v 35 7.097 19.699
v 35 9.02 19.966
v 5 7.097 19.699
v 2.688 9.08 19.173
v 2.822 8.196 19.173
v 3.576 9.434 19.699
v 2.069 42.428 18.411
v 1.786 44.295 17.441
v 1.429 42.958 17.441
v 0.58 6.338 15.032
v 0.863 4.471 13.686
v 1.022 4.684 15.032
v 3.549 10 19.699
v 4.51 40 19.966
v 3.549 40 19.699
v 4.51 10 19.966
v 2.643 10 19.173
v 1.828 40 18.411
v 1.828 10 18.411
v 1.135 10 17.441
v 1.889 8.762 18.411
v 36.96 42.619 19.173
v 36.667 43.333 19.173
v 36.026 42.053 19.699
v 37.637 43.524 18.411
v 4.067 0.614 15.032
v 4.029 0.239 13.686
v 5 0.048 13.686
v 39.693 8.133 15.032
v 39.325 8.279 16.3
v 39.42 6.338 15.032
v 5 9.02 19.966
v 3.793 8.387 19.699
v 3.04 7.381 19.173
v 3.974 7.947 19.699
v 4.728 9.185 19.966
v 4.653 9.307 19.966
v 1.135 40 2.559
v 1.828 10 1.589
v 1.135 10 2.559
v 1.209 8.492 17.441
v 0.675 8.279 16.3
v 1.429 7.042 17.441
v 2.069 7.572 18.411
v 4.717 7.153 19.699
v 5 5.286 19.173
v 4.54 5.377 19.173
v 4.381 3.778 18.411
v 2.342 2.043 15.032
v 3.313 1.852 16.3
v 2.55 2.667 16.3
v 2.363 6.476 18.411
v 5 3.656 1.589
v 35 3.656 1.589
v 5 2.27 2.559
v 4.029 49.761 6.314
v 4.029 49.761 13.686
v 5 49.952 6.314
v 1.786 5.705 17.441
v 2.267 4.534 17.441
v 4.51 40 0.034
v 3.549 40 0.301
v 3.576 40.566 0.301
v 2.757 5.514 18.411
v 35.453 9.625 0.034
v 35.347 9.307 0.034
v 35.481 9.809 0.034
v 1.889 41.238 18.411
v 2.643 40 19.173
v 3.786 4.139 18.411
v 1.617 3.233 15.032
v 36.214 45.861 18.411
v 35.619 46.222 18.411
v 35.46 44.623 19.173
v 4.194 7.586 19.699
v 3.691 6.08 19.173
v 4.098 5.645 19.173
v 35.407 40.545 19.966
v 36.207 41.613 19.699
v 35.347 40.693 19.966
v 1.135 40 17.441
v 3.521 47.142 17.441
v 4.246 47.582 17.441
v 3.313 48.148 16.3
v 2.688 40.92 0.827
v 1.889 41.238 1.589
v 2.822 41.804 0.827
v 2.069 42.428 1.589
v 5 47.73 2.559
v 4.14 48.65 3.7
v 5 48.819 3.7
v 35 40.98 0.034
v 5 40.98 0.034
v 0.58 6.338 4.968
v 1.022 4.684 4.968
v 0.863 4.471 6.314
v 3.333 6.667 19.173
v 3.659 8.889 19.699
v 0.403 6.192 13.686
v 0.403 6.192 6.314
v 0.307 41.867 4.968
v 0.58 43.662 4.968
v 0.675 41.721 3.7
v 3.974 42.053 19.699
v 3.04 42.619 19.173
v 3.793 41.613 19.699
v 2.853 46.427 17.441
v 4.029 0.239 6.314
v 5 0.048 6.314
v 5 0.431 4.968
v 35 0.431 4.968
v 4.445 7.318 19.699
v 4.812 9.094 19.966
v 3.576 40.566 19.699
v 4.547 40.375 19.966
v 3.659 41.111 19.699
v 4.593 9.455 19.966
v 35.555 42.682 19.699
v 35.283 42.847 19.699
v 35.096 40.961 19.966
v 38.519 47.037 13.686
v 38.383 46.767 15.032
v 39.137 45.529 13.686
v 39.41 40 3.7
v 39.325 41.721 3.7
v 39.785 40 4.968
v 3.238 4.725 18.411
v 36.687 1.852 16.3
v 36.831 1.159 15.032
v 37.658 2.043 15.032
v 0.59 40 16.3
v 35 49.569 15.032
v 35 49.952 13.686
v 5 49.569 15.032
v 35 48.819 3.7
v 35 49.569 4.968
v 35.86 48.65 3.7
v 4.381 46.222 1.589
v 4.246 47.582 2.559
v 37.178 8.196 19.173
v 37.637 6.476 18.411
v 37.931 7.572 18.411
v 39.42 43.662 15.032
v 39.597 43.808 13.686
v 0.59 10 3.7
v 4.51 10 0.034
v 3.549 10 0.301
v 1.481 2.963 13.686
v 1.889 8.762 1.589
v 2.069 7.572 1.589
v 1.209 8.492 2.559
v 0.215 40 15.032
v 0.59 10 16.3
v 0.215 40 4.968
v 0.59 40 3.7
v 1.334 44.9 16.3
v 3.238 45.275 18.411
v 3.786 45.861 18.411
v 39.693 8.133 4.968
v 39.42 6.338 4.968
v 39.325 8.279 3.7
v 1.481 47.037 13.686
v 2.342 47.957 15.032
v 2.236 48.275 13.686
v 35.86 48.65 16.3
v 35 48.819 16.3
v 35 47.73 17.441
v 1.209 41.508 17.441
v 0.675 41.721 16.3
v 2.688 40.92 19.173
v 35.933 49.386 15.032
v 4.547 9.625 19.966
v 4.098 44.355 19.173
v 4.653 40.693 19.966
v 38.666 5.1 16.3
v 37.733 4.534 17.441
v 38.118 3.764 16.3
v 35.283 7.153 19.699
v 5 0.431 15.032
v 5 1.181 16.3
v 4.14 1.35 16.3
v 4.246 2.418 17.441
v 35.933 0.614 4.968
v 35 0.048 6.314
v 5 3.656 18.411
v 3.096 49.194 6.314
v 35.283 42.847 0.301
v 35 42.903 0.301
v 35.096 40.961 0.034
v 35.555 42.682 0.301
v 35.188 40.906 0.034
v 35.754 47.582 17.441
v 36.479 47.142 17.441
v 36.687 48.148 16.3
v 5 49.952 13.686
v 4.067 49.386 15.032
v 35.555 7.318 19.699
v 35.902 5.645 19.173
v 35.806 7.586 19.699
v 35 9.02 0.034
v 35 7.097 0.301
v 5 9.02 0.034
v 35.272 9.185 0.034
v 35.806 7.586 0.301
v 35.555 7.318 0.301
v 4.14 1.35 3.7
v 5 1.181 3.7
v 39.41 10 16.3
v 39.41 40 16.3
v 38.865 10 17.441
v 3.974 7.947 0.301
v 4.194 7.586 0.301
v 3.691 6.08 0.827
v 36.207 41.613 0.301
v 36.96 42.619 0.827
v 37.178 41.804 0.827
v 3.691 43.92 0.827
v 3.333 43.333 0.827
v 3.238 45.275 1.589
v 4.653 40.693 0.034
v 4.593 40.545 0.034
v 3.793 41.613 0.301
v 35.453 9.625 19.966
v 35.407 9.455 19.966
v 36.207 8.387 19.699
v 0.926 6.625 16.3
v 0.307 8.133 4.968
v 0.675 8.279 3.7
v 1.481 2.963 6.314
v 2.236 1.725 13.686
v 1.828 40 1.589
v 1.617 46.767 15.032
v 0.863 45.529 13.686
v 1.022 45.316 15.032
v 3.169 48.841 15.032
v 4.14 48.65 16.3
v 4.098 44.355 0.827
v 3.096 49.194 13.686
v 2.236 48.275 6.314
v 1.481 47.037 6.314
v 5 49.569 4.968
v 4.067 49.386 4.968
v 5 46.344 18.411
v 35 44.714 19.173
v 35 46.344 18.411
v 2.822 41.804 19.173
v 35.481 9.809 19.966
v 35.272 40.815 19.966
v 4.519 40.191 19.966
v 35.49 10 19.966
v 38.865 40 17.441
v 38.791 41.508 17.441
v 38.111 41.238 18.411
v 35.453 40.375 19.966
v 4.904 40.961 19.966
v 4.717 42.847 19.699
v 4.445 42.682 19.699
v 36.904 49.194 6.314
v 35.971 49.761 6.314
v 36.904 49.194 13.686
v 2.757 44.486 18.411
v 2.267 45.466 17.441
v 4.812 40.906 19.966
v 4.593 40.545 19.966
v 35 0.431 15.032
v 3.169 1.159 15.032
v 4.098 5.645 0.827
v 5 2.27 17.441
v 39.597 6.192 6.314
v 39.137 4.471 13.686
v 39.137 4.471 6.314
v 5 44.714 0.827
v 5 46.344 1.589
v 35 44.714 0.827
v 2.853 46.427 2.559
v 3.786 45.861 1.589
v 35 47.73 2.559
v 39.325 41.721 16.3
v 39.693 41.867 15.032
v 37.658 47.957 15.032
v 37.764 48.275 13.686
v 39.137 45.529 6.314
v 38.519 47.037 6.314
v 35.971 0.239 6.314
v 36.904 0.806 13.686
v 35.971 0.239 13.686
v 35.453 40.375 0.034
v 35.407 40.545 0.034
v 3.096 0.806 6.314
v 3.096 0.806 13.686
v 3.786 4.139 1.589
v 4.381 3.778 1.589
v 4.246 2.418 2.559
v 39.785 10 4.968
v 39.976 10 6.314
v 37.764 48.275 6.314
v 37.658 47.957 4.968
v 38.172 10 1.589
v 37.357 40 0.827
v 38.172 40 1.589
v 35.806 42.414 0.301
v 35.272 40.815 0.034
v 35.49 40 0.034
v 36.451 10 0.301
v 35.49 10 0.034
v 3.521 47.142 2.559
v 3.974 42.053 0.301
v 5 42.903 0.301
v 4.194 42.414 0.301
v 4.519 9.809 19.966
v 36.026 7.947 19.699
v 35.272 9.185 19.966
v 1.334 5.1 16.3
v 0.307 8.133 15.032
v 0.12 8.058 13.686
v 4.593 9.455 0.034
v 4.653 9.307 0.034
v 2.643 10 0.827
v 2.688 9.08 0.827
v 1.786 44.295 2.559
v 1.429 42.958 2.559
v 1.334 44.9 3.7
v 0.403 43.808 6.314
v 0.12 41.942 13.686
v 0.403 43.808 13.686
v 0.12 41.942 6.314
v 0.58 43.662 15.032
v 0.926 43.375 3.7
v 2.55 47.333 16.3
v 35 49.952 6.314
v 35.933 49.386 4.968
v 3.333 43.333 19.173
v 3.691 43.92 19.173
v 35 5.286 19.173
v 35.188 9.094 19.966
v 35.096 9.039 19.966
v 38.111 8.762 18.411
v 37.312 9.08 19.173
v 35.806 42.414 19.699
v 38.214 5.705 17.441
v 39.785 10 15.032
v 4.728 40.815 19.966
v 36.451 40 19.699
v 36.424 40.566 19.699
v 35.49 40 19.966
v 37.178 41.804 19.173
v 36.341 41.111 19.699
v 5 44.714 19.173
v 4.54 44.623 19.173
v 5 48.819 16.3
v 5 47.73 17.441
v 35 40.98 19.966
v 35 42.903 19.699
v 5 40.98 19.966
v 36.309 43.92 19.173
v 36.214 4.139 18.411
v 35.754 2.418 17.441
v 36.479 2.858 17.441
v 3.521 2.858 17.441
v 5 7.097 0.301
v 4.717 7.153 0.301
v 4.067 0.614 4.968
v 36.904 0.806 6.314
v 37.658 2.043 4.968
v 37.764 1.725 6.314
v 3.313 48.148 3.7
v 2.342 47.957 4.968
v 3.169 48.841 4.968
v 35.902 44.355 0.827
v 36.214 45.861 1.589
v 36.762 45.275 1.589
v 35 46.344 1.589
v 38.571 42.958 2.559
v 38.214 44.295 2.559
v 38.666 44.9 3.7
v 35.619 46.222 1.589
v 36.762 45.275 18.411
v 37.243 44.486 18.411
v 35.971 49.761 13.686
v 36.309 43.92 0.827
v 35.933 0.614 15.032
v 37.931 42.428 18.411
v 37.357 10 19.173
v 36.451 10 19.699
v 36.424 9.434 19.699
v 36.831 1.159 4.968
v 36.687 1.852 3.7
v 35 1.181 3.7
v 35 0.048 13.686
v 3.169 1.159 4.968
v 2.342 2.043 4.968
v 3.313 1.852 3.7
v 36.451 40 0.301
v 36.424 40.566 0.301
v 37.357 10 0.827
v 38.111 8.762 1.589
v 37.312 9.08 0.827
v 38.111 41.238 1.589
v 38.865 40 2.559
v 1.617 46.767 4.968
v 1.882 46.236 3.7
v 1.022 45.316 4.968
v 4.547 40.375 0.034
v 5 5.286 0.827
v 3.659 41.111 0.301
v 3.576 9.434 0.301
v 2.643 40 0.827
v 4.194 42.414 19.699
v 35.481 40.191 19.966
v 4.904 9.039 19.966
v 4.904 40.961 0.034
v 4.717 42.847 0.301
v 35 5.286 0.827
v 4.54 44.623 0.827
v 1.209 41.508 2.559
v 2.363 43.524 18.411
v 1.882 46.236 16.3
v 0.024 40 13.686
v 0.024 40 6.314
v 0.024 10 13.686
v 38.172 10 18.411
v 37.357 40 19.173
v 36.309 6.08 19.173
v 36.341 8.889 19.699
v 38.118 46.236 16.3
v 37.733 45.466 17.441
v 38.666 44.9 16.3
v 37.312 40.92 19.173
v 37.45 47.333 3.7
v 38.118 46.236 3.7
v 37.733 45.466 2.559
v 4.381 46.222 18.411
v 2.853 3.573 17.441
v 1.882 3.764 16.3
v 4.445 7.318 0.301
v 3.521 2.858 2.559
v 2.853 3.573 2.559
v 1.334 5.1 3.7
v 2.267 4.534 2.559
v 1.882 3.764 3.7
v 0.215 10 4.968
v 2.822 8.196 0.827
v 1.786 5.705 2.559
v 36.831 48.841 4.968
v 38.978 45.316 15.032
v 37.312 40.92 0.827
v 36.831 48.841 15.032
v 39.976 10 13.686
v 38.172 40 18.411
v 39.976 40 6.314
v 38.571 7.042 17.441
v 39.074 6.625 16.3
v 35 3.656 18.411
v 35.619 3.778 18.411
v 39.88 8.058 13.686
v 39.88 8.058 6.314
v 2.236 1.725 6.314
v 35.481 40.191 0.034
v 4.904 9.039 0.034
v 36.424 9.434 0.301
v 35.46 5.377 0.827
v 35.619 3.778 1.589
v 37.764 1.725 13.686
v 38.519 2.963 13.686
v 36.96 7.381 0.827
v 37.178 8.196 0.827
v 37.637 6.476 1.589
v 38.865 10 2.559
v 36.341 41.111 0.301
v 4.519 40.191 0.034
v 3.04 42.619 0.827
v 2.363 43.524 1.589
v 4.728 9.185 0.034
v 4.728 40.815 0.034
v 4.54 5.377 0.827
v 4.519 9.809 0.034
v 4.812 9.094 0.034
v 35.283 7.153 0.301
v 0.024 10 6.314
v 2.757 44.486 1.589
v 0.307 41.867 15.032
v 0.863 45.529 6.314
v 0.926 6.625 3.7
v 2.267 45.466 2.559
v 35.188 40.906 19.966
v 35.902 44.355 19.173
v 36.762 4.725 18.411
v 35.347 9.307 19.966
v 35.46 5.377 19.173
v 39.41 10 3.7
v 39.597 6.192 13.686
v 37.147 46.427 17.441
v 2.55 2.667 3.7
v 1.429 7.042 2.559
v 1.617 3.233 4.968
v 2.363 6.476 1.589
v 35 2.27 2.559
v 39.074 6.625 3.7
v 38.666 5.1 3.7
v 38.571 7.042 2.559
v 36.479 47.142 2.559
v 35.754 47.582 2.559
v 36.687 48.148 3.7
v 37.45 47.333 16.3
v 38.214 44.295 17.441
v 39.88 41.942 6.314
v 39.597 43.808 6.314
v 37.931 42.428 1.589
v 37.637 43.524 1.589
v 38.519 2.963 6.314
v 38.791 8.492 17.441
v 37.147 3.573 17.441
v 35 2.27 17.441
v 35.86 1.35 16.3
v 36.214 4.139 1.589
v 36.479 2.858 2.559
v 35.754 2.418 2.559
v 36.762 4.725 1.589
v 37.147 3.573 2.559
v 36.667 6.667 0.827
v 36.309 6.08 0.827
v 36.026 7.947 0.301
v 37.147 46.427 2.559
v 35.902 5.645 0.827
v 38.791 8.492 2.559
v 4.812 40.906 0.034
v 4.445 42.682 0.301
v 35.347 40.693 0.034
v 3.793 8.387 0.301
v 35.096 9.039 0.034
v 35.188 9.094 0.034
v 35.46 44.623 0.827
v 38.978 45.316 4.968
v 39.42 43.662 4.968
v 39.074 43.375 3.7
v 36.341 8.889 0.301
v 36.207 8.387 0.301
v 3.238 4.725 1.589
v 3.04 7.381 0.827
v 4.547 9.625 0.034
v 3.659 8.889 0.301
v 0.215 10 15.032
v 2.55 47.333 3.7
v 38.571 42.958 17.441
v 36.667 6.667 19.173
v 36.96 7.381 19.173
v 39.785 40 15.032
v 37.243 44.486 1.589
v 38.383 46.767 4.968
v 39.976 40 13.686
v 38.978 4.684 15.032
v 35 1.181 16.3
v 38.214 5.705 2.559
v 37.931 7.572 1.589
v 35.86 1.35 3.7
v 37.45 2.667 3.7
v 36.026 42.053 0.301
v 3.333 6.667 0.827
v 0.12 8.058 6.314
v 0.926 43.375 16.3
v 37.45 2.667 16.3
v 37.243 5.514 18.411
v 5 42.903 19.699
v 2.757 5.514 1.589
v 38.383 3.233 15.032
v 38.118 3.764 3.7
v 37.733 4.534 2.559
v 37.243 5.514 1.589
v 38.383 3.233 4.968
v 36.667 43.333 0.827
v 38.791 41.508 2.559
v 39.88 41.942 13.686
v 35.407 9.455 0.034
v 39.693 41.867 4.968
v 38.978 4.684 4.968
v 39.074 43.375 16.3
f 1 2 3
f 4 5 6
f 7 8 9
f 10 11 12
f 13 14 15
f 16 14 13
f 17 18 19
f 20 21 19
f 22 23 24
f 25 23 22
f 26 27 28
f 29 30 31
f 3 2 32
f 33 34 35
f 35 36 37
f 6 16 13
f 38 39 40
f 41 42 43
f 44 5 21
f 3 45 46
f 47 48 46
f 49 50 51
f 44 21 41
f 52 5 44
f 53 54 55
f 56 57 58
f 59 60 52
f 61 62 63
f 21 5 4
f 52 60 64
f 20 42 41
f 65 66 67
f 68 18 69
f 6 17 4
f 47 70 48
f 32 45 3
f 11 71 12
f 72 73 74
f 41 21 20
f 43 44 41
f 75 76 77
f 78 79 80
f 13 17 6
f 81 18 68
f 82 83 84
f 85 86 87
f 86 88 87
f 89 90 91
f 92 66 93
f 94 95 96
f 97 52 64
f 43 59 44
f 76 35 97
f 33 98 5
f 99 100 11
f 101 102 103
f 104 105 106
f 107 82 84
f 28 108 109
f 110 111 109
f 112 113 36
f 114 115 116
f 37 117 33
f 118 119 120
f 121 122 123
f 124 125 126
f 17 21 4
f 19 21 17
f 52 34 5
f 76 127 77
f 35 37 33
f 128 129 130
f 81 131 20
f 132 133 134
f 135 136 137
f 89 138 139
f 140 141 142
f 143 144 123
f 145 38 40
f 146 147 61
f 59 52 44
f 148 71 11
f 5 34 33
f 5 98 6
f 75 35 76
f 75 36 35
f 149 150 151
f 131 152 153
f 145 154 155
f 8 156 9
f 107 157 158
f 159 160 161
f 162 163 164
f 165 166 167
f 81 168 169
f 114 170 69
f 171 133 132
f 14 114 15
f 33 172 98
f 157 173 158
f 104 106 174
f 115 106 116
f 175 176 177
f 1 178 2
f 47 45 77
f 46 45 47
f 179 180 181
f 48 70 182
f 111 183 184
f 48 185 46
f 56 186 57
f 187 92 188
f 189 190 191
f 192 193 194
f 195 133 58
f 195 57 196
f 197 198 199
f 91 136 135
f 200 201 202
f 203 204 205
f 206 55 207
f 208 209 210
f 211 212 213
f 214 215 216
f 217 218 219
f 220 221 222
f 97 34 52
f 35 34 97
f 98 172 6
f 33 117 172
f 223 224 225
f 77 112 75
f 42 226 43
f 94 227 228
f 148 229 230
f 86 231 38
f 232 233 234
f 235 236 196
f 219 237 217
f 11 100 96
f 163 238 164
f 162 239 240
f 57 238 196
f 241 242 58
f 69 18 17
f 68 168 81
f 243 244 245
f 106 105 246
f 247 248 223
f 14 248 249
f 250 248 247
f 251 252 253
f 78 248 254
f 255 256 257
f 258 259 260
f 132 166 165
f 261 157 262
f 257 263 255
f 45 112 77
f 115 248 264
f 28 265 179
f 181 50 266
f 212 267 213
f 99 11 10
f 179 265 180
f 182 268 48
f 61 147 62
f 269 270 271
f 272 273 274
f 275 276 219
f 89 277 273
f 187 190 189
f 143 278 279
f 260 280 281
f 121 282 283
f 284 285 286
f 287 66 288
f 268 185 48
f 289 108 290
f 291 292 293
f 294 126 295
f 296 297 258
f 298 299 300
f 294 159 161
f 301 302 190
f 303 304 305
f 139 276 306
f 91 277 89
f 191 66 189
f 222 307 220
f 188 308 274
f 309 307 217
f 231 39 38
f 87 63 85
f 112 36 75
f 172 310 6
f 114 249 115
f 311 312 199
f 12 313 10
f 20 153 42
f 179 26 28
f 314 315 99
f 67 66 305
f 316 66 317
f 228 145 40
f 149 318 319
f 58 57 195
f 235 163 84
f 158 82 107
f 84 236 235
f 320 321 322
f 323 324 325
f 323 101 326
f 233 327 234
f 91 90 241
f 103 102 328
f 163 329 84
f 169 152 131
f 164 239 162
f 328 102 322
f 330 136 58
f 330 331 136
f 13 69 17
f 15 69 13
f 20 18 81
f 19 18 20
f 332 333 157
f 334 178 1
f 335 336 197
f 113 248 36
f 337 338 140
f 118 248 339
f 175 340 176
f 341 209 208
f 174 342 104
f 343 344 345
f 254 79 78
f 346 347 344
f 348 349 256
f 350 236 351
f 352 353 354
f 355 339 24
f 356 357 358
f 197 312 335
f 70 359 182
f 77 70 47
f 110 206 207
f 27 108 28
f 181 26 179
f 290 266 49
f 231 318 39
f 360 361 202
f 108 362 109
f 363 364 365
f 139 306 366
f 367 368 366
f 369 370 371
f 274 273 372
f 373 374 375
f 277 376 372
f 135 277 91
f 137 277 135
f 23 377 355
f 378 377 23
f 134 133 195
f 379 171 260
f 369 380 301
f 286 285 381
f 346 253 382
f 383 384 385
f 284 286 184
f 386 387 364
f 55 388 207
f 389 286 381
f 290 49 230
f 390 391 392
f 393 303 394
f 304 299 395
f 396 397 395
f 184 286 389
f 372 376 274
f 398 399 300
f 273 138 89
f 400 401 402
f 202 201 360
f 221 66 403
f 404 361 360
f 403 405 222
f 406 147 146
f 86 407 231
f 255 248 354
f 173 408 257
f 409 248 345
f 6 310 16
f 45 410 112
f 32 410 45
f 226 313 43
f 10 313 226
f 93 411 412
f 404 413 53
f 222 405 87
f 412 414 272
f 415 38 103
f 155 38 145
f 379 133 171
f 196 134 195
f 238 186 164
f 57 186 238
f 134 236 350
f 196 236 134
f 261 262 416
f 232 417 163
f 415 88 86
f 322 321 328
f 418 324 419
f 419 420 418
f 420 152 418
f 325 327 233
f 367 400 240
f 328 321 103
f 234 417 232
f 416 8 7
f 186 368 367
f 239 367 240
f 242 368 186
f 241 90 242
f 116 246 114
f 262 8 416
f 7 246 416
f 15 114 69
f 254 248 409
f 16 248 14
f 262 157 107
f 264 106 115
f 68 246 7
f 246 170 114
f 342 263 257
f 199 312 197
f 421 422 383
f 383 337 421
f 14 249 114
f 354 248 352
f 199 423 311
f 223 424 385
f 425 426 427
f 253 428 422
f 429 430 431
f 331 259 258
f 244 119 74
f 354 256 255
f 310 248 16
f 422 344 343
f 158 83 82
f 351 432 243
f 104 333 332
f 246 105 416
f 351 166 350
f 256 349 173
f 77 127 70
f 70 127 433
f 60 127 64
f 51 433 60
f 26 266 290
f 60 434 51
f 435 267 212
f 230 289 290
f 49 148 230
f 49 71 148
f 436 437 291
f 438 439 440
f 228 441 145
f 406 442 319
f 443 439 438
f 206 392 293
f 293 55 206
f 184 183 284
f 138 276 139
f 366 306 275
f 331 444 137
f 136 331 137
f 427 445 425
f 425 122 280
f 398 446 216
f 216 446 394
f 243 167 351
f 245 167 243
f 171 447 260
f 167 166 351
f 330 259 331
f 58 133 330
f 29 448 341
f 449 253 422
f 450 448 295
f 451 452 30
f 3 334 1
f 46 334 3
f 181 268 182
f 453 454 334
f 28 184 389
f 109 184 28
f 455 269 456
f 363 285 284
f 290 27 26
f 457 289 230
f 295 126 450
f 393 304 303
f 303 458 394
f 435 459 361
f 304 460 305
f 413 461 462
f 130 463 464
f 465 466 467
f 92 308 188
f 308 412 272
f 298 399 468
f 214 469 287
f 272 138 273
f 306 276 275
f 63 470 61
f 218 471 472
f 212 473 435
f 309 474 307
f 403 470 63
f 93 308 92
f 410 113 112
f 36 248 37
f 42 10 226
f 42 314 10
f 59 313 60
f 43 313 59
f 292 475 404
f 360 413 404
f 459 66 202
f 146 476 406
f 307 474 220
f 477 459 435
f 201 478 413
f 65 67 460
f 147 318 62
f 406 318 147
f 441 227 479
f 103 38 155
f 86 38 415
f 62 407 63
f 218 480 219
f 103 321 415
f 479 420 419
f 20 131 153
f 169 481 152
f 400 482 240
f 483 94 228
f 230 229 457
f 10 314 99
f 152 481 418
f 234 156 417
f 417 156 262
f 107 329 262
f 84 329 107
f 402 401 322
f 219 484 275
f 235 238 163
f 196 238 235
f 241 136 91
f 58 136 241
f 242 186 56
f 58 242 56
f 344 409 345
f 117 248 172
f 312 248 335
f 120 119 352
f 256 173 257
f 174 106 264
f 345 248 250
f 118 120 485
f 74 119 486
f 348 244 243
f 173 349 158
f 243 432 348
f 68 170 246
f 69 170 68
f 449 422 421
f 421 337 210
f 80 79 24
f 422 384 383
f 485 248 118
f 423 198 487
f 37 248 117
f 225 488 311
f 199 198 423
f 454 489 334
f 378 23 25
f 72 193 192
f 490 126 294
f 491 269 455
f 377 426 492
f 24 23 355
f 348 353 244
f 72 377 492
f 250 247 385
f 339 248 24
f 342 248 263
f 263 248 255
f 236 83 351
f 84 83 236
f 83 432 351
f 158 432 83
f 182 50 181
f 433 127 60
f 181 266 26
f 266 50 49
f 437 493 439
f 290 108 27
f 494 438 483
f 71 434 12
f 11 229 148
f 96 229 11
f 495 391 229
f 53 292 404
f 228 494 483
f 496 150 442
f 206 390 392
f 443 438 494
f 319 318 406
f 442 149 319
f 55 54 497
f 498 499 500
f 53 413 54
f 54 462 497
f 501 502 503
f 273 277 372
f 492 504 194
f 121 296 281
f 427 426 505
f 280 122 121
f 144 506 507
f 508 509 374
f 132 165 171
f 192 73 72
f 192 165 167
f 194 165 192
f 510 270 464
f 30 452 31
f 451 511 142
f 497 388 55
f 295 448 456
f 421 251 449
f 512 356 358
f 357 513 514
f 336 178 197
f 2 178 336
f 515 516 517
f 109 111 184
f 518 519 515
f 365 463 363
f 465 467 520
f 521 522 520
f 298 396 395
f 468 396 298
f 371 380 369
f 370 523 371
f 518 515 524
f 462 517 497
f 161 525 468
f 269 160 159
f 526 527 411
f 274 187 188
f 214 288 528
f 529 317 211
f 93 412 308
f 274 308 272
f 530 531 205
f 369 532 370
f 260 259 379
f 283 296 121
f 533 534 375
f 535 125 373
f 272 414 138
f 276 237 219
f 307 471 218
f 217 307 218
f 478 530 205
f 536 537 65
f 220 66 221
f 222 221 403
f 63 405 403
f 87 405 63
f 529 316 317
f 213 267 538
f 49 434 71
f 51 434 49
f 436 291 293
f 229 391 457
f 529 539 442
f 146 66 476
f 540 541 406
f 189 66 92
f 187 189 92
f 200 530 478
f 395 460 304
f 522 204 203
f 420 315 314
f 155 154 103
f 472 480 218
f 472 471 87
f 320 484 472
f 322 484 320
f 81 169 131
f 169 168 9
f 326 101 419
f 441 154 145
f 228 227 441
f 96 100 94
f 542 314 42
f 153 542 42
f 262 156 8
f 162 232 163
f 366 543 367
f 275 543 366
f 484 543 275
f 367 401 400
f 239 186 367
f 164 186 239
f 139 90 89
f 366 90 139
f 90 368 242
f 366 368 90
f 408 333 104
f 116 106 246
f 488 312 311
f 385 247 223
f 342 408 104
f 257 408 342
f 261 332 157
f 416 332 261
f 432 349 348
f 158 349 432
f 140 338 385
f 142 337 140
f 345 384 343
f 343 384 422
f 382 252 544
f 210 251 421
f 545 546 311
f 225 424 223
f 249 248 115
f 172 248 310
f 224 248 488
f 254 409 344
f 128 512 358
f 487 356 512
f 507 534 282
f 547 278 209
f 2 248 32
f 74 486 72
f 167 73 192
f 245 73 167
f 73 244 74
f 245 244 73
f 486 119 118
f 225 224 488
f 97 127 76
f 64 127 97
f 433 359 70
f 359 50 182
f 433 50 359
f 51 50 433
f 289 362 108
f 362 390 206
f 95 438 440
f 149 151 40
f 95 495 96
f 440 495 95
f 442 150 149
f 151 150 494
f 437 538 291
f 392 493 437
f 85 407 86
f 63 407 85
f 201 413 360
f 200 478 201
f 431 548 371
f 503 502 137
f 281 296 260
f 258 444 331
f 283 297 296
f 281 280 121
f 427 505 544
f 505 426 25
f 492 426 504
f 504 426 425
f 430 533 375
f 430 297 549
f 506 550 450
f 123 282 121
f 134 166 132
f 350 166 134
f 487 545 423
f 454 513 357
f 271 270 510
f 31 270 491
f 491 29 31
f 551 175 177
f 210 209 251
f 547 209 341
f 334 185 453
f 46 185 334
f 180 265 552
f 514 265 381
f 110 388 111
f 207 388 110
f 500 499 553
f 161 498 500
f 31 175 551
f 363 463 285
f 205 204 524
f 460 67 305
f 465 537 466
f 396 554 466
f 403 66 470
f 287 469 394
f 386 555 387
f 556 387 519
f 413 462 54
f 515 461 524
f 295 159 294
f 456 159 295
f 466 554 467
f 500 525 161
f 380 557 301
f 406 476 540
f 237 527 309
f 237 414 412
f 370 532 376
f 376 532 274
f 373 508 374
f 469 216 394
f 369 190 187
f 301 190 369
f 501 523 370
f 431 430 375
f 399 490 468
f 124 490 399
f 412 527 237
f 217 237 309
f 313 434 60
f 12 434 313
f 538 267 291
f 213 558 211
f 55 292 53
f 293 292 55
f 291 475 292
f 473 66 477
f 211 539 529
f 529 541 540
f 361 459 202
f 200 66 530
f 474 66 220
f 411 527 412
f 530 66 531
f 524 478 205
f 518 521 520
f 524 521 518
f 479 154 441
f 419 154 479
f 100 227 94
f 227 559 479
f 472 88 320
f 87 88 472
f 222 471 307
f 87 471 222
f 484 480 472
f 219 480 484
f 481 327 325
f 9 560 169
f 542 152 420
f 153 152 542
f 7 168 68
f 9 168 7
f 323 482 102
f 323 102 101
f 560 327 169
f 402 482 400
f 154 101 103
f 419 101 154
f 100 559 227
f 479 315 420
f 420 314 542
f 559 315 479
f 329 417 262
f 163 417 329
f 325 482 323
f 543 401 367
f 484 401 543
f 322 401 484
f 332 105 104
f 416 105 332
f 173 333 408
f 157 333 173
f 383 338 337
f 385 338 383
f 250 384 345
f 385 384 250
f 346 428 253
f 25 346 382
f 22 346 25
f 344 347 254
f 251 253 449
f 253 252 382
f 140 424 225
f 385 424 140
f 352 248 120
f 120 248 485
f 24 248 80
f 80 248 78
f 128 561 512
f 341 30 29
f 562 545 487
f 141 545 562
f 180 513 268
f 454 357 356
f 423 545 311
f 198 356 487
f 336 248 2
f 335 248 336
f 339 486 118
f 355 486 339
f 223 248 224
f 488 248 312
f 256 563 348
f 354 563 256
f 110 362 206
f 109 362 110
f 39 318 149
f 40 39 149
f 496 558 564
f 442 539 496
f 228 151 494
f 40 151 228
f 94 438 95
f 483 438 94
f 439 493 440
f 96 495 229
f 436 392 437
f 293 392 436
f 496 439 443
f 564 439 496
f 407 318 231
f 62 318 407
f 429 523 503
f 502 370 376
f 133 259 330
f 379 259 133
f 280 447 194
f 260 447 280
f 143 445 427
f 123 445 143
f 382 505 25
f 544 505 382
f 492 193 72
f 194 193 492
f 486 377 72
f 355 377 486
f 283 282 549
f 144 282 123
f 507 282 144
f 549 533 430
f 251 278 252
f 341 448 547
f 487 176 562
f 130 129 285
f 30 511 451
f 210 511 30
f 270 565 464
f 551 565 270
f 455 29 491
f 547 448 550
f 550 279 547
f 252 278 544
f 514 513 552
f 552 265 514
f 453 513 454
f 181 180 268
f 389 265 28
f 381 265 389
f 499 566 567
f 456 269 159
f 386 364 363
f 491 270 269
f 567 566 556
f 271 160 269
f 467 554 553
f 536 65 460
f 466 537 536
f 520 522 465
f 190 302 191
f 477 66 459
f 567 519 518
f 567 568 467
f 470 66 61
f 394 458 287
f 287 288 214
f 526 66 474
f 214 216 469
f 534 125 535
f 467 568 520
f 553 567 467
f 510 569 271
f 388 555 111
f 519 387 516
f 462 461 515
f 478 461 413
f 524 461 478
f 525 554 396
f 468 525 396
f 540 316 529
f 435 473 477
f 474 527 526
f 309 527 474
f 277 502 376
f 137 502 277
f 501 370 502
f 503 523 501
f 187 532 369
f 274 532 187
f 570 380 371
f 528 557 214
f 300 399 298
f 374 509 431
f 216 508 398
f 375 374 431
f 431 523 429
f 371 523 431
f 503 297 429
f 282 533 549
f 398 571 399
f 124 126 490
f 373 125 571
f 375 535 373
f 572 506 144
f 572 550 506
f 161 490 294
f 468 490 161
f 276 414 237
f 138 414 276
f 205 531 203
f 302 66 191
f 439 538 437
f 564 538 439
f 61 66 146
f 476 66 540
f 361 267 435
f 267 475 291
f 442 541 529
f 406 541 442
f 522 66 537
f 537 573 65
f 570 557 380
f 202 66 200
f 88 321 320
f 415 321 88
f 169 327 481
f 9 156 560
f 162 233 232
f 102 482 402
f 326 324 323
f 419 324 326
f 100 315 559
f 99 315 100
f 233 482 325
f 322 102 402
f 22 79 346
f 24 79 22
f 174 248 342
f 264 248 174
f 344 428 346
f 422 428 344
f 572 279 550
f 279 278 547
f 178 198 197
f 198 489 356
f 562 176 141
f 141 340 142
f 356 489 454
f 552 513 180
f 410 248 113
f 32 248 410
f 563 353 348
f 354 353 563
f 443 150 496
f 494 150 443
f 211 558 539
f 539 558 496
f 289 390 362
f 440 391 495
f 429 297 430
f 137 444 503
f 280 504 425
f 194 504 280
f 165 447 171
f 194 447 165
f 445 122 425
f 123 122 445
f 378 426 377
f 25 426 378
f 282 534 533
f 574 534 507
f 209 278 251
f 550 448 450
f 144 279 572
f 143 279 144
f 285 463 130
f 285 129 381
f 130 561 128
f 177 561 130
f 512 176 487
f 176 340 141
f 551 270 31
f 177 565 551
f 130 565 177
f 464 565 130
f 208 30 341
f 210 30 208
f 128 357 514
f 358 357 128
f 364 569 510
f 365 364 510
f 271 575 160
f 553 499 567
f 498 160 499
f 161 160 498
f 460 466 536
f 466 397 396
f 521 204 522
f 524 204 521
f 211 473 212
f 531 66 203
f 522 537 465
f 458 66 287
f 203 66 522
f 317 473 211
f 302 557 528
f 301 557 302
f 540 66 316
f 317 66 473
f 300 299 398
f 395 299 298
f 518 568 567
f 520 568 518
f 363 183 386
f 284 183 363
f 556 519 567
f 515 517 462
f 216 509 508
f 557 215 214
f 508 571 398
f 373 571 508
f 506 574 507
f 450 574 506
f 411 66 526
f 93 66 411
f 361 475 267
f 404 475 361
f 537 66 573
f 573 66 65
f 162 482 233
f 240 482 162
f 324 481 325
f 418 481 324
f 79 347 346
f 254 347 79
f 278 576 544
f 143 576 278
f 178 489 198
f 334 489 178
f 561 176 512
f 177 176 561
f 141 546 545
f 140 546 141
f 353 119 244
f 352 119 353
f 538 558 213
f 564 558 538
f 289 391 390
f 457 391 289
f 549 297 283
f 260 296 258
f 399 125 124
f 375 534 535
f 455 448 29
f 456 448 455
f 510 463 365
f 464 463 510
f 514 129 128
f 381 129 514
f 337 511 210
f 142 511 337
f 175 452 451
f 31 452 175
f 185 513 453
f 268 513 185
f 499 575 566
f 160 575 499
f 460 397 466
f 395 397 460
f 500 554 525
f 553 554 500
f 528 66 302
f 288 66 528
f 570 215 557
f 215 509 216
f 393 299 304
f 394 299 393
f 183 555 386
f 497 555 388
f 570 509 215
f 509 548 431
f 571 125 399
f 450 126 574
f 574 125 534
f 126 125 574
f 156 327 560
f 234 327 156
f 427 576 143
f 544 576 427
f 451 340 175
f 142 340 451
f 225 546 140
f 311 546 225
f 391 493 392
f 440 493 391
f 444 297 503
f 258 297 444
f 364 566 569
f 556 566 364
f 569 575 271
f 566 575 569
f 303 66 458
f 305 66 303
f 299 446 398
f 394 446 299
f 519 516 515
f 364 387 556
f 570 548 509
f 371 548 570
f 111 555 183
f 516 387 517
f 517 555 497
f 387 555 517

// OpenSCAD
/*
 *  OpenSCAD utilities 
 *
 *  by Ph.Gregoire AKA Greg Ware <greg.ware@laposte.net>
 *  
 *  Includes:
 *   - shorter macro modules to get a cube or cylinder with translation and rotation
 *   -  Due to some display defects in OpenSCAD preview (F5), some can use a small epsilon 
 *      so as to cut protruding apertures in solids
 *   - useful modules to build rounded corner cubes, prism (wedges), etc
 *
 * History
 * Date       Author      Description
 * 2017/??/?? Ph.Gregoire Initial version(s)
 * 2018/07/18 Ph.Gregoire Rework for X5S corners
 * 2020/04/30 Ph.Gregoire V2: Functions from Elec.scad
 *
 *  This work is licensed under the 
 *  Creative Commons Attribution 3.0 Unported License.
 *  To view a copy of this license, visit
 *    http://creativecommons.org/licenses/by/3.0/ 
 *  or send a letter to 
 *    Creative Commons, PO Box 1866, Mountain View, CA 94042, USA.
*/

// Thickness of supports for apertures
$_SUPPORT_THK=0.2;

// Cylinders $fn default
$_FN_CYL=$preview?12:32;
function GET_FN_CYL()=$_FN_CYL;

// Epsilon
$_EPSILON=0.2;
//function GET_EPSILON()=$preview?$_EPSILON:0;
function GET_EPSILON()=$_EPSILON;

/* Simple translation */
module tr(dx,dy=0,dz=0) {
    translate([dx,dy,dz]) children();
}

/* Z-translation */
module trz(dz) {
    translate([0,0,dz]) children();
}

/* Simple rotation */
module rot(ax=90,ay=0,az=0) {
    rotate([ax,ay,az]) children();
}

/* Simple rotation */
module rotY(ay=90) {
    rotate([0,ay,0]) children();
}

/* Translate and rotate children */
module trrot(tx,ty,tz,ax,ay=0,az=0) {
    translate([tx,ty,tz]) rotate([ax,ay,az]) children();
}

/* translated cube */
module trcube(tx,ty,tz,dx,dy,dz,center=false) {
    translate([tx,ty,tz]) cube(size=[dx,dy,dz],center=center);
}

/* translated cube with epsilons along Z */
module trcube_eps(tx,ty,tz,dx,dy,dz) {
    translate([tx,ty,tz-$_EPSILON]) cube([dx,dy,dz+2*$_EPSILON]);
}

/* translated cylinder */
module trcyl(tx,ty,tz,d,h,center=false,fn=$_FN_CYL) {
	translate([tx,ty,tz]) cylinder(d=d,h=h,center=center,$fn=fn);
}

/* translated cone */
module trcone(tx,ty,tz,d1,d2,h,center=false,fn=$_FN_CYL) {
	translate([tx,ty,tz]) cylinder(d1=d1,d2=d2,h=h,center=center,$fn=fn);
}

/* cylinder with epsilon along Z axis */
module cyl_eps(d,h,center=false,fn=$_FN_CYL) {
    cylinder(d=d,h=h+2*$_EPSILON,center=center,$fn=fn);
}

/* translated cylinder with epsilon along height (Z) */
module trcyl_eps(tx,ty,tz,d,h,center=false,fn=$_FN_CYL) {
    translate([tx,ty,tz-$_EPSILON]) cyl_eps(d,h,center=center,fn=fn);
}

module trrotcyl(tx,ty,tz,ax,ay,az,d,h,center=false,fn=$_FN_CYL) {
	trrot(tx,ty,tz,ax,ay,az) cylinder(d=d,h=h,center=center,$fn=fn);
}

module tube(dint,dout,h,center,fn=$_FN_CYL) {
    difference() {
        cylinder(d=dout,h=h,center=center,$fn=fn);
        cylinder(d=dint,h=h,center=center,$fn=fn);
    }
}

module trrottube(tx,ty,tz,ax,ay,az,dout,dint,h,center=false,fn=$_FN_CYL) {
	trrot(tx,ty,tz,ax,ay,az) tube(dout=dout,dint=dint,h=h,center=center,$fn=fn);
}

/* translated and rotated cylinder with epsilon along height (Z) */
module trrotcyl_eps(tx,ty,tz,ax,ay,az,d,h,center=false,fn=$_FN_CYL) {
    trrot(tx,ty,tz,ax,ay,az) translate([0,0,-$_EPSILON]) cylinder(d=d,h=h+2*$_EPSILON,center=center,$fn=fn);
}

/* translated and rotated cube */
module trrotcube(tx,ty,tz,ax,ay,az,dx,dy,dz,center=false) {
    trrot(tx,ty,tz,ax,ay,az) cube([dx,dy,dz],center=center);
}

/* rotated and translated cube */
module rottrcube(tx,ty,tz,ax,ay,az,dx,dy,dz,center=false) {
    rotate([ax,ay,az]) tr(tx,ty,tz) cube([dx,dy,dz],center=center);
}

/* Translated rotate cube with diff children (in cube referential) */
module trrotcube_diff(tx,ty,tz,ax,ay,az,dx,dy,dz) {
    trrot(tx,ty,tz,ax,ay,az) difference() {
        cube([dx,dy,dz]);
        children();
    }
}

/* Box with apertures cut out from children */
module boxWithApertures(w,l,h,t) {
    // Bottom
    trcube(-w/2-t,-l/2-t,0,w+2*t,l+2*t,t);

    // sides
    for(s=[0:3]) {
        L=w*((s+1)%2)+l*(s%2)+2*t;
        P=l*((s+1)%2)+w*(s%2);
        
        rotate([0,0,s*90]) {
            translate([-L/2,P/2,t]) {
                difference() {
                    cube([L,t,h]);
                    // aperture
                    if($children>s) {
                        translate([thk,thk,0]) rotate([90,0,0]) children(s);
                    }
                }
            }
        }
    }

}

/* Make a support: remove a thin support layer from a flat shape */
module supportDiff(thk) {
    difference() {
        children(0);
        translate([0,0,thk/2]) {
            linear_extrude(height=$_SUPPORT_THK) projection() children(0);
        }
    }
}

/* Lateral vents 
    n: number of vents
    h: height of vent and vent spacing
    l: horizontal length of vent
    x: horizontal x offset of vent
    z: vertical offset of first vent
    t: thickness of panel
*/
module vents(n,h,l,x,z,t) {
    for(v=[0:n-1]) {
        trcube_eps(x,z+2*v*h,0,l,h,t);
    }
}

/* Fan vent 
    w: width of panel
    dz: height of center of fan
    df: diameter of fan
    dh: diameter of hub
    fs: Number of fan spokes
    t: thickness of panel
*/
module fanvent(w,dz,df,dh,fs,t) {
    difference() {
        // External
        trcyl_eps(w/2,dz,0,df,t);
        
        // central hub
        trcyl_eps(w/2,dz,0,dh,t);
        
        // spokes
        translate([w/2,dz,0]) {
            for(a=[0:fs-1]) {
                rotate([0,0,180+a*(360/fs)]) trcube_eps(-t/2,0,0,t,df,t);
            }
        }
    }
}
/* Fan mounting holes
    w: Width of panel
    dz: height of center of fan
    wfh: width of fan holes
    dfh: diameter of fan holes
    t: thickness of panel
*/
module fanholes(w,dz,wfh,dfh,t) {
    for(x=[-1,1]) {
        for(y=[-1,1]) {
            trcyl_eps(w/2+wfh/2*x,dz+wfh/2*y,0,dfh,t);
        }
    }
}

/* Position children in one corner of box, using a centered box */
module cornerPos(w,l,h,x,y,center=true) {
    translate([center?x*w/2:(x+1)*w/2,center?y*l/2:(y+1)*l/2,h]) {
        if(x==-1 && y==-1) children();
        if(x==1 && y==-1) rotate([0,0,90]) children();
        if(x==1 && y==1) rotate([0,0,180]) children();
        if(x==-1 && y==1) rotate([0,0,270]) children();
    }
}

/* Position children at each 4 corners of centered cube */ 
module cornersPos(w,l,h=0,center=true) {
 for(x=[-1,1]) {
        for(y=[-1,1]) {
            cornerPos(w,l,h,x,y,center=center) children();
        }
    }
}

/* Quarter Cone */
module quarterCone(r1,r2,h) {
    intersection() {
        cylinder(r1=r2,r2=r1,h=h);
        cube([r1>r2?r1:r2,r1>r2?r1:r2,h]);
    }
}

module quarterCyl(r,h) {
    intersection() {
        cylinder(r=r,h=h,$fn=$_FN_CYL);
        cube([r,r,h]);
    }
}

/* Corner rounding */
module champfer(rounding,h) {
    difference() {
        translate([-$_EPSILON,-$_EPSILON,-$_EPSILON])
            cube([rounding+$_EPSILON,rounding+$_EPSILON,h+2*$_EPSILON]);
        translate([rounding,rounding])
            cylinder(r=rounding,h=h);
    }
}

/* Deprecated, use prism() */
module triangle(dx,dy,h,a=0) {
    prism(dx,dy,h,a);
}

/* Prism by extrusion of q triqngle. The a parameter is the rotation angle */
module prism(dx,dy,h,a=0) {
    if(a<0) prism(dx,dy,h,a=a+360);
    else {
        a=a%360;
        linear_extrude(height=h) {
            if(a<90) polygon(points=[[0,0],[dx,0],[0,dy],[0,0]]);
            else if(a<180) polygon(points=[[0,0],[dx,dy],[dx,0],[0,0]]);
            else if(a<270) polygon(points=[[dx,dy],[0,dy],[dx,0],[dx,dy]]);
            else if(a<360) polygon(points=[[0,0],[dx,dy],[0,dy],[0,0]]);
        }
    }
}

module roundedFlatBox(dx,dy,h,r,center=false) {
    translate([center?r-dx/2:r,center?r-dy/2:r]) 
    linear_extrude(height=h)
    offset(r=r)
    square([dx-2*r,dy-2*r]);
}

module roundedBoundingBox(dx,dy,dz,rx,ry,rz) {
    minkowski() {
        trcube(rx,ry,rz,dx-2*rx,dy-2*ry,dz-2*rz);
        r=max(rx,ry,rz);
        scale([rx/r,ry/r,rz/r]) sphere(r);
    }
}

/* Generate a quater of a torus */
module quarterTorus(r,d) {
    intersection() {
        rot(0,0,180) trcube(0,0,-d/2,r+d/2,r+d/2,d);
        rotate_extrude(convexity = 2) {
            tr(r) circle(d=d);
        }
    }
}

/* Square with one rounded corner */
module roundedSquare(d,h) {
    cylinder(d=d,h=h);
    trcube(-d/2,0,0,d/2,d/2,h);
    trcube(0,-d/2,0,d/2,d/2,h);
    trcube(0,0,0,d/2,d/2,h);
}

/* Utility to have a rectangle with the far most corner rounded */
module roundedRect(dx,dy,r,h) {
    union() {
        intersection() {
            trcyl(dx-r,dy-r,h/2,d=r*2,h=h,center=true);
            trcube(dx-r/2,dy-r/2,h/2,r,r,h,center=true);
        }
        trcube(0,dy-r,0,dx-r,r,h);
        trcube(dx-r,0,0,r,dy-r,h);
        trcube(0,0,0,dx-r,dy-r,h);
    }
}


test();

module test() {
    $fn=$_FN_CYL;
    
    //prism(30,20,10,270);
    //quarterCyl(5,10);
    //champfer(5,10);
    roundedBoundingBox(40,50,20,5,10,7);
}
